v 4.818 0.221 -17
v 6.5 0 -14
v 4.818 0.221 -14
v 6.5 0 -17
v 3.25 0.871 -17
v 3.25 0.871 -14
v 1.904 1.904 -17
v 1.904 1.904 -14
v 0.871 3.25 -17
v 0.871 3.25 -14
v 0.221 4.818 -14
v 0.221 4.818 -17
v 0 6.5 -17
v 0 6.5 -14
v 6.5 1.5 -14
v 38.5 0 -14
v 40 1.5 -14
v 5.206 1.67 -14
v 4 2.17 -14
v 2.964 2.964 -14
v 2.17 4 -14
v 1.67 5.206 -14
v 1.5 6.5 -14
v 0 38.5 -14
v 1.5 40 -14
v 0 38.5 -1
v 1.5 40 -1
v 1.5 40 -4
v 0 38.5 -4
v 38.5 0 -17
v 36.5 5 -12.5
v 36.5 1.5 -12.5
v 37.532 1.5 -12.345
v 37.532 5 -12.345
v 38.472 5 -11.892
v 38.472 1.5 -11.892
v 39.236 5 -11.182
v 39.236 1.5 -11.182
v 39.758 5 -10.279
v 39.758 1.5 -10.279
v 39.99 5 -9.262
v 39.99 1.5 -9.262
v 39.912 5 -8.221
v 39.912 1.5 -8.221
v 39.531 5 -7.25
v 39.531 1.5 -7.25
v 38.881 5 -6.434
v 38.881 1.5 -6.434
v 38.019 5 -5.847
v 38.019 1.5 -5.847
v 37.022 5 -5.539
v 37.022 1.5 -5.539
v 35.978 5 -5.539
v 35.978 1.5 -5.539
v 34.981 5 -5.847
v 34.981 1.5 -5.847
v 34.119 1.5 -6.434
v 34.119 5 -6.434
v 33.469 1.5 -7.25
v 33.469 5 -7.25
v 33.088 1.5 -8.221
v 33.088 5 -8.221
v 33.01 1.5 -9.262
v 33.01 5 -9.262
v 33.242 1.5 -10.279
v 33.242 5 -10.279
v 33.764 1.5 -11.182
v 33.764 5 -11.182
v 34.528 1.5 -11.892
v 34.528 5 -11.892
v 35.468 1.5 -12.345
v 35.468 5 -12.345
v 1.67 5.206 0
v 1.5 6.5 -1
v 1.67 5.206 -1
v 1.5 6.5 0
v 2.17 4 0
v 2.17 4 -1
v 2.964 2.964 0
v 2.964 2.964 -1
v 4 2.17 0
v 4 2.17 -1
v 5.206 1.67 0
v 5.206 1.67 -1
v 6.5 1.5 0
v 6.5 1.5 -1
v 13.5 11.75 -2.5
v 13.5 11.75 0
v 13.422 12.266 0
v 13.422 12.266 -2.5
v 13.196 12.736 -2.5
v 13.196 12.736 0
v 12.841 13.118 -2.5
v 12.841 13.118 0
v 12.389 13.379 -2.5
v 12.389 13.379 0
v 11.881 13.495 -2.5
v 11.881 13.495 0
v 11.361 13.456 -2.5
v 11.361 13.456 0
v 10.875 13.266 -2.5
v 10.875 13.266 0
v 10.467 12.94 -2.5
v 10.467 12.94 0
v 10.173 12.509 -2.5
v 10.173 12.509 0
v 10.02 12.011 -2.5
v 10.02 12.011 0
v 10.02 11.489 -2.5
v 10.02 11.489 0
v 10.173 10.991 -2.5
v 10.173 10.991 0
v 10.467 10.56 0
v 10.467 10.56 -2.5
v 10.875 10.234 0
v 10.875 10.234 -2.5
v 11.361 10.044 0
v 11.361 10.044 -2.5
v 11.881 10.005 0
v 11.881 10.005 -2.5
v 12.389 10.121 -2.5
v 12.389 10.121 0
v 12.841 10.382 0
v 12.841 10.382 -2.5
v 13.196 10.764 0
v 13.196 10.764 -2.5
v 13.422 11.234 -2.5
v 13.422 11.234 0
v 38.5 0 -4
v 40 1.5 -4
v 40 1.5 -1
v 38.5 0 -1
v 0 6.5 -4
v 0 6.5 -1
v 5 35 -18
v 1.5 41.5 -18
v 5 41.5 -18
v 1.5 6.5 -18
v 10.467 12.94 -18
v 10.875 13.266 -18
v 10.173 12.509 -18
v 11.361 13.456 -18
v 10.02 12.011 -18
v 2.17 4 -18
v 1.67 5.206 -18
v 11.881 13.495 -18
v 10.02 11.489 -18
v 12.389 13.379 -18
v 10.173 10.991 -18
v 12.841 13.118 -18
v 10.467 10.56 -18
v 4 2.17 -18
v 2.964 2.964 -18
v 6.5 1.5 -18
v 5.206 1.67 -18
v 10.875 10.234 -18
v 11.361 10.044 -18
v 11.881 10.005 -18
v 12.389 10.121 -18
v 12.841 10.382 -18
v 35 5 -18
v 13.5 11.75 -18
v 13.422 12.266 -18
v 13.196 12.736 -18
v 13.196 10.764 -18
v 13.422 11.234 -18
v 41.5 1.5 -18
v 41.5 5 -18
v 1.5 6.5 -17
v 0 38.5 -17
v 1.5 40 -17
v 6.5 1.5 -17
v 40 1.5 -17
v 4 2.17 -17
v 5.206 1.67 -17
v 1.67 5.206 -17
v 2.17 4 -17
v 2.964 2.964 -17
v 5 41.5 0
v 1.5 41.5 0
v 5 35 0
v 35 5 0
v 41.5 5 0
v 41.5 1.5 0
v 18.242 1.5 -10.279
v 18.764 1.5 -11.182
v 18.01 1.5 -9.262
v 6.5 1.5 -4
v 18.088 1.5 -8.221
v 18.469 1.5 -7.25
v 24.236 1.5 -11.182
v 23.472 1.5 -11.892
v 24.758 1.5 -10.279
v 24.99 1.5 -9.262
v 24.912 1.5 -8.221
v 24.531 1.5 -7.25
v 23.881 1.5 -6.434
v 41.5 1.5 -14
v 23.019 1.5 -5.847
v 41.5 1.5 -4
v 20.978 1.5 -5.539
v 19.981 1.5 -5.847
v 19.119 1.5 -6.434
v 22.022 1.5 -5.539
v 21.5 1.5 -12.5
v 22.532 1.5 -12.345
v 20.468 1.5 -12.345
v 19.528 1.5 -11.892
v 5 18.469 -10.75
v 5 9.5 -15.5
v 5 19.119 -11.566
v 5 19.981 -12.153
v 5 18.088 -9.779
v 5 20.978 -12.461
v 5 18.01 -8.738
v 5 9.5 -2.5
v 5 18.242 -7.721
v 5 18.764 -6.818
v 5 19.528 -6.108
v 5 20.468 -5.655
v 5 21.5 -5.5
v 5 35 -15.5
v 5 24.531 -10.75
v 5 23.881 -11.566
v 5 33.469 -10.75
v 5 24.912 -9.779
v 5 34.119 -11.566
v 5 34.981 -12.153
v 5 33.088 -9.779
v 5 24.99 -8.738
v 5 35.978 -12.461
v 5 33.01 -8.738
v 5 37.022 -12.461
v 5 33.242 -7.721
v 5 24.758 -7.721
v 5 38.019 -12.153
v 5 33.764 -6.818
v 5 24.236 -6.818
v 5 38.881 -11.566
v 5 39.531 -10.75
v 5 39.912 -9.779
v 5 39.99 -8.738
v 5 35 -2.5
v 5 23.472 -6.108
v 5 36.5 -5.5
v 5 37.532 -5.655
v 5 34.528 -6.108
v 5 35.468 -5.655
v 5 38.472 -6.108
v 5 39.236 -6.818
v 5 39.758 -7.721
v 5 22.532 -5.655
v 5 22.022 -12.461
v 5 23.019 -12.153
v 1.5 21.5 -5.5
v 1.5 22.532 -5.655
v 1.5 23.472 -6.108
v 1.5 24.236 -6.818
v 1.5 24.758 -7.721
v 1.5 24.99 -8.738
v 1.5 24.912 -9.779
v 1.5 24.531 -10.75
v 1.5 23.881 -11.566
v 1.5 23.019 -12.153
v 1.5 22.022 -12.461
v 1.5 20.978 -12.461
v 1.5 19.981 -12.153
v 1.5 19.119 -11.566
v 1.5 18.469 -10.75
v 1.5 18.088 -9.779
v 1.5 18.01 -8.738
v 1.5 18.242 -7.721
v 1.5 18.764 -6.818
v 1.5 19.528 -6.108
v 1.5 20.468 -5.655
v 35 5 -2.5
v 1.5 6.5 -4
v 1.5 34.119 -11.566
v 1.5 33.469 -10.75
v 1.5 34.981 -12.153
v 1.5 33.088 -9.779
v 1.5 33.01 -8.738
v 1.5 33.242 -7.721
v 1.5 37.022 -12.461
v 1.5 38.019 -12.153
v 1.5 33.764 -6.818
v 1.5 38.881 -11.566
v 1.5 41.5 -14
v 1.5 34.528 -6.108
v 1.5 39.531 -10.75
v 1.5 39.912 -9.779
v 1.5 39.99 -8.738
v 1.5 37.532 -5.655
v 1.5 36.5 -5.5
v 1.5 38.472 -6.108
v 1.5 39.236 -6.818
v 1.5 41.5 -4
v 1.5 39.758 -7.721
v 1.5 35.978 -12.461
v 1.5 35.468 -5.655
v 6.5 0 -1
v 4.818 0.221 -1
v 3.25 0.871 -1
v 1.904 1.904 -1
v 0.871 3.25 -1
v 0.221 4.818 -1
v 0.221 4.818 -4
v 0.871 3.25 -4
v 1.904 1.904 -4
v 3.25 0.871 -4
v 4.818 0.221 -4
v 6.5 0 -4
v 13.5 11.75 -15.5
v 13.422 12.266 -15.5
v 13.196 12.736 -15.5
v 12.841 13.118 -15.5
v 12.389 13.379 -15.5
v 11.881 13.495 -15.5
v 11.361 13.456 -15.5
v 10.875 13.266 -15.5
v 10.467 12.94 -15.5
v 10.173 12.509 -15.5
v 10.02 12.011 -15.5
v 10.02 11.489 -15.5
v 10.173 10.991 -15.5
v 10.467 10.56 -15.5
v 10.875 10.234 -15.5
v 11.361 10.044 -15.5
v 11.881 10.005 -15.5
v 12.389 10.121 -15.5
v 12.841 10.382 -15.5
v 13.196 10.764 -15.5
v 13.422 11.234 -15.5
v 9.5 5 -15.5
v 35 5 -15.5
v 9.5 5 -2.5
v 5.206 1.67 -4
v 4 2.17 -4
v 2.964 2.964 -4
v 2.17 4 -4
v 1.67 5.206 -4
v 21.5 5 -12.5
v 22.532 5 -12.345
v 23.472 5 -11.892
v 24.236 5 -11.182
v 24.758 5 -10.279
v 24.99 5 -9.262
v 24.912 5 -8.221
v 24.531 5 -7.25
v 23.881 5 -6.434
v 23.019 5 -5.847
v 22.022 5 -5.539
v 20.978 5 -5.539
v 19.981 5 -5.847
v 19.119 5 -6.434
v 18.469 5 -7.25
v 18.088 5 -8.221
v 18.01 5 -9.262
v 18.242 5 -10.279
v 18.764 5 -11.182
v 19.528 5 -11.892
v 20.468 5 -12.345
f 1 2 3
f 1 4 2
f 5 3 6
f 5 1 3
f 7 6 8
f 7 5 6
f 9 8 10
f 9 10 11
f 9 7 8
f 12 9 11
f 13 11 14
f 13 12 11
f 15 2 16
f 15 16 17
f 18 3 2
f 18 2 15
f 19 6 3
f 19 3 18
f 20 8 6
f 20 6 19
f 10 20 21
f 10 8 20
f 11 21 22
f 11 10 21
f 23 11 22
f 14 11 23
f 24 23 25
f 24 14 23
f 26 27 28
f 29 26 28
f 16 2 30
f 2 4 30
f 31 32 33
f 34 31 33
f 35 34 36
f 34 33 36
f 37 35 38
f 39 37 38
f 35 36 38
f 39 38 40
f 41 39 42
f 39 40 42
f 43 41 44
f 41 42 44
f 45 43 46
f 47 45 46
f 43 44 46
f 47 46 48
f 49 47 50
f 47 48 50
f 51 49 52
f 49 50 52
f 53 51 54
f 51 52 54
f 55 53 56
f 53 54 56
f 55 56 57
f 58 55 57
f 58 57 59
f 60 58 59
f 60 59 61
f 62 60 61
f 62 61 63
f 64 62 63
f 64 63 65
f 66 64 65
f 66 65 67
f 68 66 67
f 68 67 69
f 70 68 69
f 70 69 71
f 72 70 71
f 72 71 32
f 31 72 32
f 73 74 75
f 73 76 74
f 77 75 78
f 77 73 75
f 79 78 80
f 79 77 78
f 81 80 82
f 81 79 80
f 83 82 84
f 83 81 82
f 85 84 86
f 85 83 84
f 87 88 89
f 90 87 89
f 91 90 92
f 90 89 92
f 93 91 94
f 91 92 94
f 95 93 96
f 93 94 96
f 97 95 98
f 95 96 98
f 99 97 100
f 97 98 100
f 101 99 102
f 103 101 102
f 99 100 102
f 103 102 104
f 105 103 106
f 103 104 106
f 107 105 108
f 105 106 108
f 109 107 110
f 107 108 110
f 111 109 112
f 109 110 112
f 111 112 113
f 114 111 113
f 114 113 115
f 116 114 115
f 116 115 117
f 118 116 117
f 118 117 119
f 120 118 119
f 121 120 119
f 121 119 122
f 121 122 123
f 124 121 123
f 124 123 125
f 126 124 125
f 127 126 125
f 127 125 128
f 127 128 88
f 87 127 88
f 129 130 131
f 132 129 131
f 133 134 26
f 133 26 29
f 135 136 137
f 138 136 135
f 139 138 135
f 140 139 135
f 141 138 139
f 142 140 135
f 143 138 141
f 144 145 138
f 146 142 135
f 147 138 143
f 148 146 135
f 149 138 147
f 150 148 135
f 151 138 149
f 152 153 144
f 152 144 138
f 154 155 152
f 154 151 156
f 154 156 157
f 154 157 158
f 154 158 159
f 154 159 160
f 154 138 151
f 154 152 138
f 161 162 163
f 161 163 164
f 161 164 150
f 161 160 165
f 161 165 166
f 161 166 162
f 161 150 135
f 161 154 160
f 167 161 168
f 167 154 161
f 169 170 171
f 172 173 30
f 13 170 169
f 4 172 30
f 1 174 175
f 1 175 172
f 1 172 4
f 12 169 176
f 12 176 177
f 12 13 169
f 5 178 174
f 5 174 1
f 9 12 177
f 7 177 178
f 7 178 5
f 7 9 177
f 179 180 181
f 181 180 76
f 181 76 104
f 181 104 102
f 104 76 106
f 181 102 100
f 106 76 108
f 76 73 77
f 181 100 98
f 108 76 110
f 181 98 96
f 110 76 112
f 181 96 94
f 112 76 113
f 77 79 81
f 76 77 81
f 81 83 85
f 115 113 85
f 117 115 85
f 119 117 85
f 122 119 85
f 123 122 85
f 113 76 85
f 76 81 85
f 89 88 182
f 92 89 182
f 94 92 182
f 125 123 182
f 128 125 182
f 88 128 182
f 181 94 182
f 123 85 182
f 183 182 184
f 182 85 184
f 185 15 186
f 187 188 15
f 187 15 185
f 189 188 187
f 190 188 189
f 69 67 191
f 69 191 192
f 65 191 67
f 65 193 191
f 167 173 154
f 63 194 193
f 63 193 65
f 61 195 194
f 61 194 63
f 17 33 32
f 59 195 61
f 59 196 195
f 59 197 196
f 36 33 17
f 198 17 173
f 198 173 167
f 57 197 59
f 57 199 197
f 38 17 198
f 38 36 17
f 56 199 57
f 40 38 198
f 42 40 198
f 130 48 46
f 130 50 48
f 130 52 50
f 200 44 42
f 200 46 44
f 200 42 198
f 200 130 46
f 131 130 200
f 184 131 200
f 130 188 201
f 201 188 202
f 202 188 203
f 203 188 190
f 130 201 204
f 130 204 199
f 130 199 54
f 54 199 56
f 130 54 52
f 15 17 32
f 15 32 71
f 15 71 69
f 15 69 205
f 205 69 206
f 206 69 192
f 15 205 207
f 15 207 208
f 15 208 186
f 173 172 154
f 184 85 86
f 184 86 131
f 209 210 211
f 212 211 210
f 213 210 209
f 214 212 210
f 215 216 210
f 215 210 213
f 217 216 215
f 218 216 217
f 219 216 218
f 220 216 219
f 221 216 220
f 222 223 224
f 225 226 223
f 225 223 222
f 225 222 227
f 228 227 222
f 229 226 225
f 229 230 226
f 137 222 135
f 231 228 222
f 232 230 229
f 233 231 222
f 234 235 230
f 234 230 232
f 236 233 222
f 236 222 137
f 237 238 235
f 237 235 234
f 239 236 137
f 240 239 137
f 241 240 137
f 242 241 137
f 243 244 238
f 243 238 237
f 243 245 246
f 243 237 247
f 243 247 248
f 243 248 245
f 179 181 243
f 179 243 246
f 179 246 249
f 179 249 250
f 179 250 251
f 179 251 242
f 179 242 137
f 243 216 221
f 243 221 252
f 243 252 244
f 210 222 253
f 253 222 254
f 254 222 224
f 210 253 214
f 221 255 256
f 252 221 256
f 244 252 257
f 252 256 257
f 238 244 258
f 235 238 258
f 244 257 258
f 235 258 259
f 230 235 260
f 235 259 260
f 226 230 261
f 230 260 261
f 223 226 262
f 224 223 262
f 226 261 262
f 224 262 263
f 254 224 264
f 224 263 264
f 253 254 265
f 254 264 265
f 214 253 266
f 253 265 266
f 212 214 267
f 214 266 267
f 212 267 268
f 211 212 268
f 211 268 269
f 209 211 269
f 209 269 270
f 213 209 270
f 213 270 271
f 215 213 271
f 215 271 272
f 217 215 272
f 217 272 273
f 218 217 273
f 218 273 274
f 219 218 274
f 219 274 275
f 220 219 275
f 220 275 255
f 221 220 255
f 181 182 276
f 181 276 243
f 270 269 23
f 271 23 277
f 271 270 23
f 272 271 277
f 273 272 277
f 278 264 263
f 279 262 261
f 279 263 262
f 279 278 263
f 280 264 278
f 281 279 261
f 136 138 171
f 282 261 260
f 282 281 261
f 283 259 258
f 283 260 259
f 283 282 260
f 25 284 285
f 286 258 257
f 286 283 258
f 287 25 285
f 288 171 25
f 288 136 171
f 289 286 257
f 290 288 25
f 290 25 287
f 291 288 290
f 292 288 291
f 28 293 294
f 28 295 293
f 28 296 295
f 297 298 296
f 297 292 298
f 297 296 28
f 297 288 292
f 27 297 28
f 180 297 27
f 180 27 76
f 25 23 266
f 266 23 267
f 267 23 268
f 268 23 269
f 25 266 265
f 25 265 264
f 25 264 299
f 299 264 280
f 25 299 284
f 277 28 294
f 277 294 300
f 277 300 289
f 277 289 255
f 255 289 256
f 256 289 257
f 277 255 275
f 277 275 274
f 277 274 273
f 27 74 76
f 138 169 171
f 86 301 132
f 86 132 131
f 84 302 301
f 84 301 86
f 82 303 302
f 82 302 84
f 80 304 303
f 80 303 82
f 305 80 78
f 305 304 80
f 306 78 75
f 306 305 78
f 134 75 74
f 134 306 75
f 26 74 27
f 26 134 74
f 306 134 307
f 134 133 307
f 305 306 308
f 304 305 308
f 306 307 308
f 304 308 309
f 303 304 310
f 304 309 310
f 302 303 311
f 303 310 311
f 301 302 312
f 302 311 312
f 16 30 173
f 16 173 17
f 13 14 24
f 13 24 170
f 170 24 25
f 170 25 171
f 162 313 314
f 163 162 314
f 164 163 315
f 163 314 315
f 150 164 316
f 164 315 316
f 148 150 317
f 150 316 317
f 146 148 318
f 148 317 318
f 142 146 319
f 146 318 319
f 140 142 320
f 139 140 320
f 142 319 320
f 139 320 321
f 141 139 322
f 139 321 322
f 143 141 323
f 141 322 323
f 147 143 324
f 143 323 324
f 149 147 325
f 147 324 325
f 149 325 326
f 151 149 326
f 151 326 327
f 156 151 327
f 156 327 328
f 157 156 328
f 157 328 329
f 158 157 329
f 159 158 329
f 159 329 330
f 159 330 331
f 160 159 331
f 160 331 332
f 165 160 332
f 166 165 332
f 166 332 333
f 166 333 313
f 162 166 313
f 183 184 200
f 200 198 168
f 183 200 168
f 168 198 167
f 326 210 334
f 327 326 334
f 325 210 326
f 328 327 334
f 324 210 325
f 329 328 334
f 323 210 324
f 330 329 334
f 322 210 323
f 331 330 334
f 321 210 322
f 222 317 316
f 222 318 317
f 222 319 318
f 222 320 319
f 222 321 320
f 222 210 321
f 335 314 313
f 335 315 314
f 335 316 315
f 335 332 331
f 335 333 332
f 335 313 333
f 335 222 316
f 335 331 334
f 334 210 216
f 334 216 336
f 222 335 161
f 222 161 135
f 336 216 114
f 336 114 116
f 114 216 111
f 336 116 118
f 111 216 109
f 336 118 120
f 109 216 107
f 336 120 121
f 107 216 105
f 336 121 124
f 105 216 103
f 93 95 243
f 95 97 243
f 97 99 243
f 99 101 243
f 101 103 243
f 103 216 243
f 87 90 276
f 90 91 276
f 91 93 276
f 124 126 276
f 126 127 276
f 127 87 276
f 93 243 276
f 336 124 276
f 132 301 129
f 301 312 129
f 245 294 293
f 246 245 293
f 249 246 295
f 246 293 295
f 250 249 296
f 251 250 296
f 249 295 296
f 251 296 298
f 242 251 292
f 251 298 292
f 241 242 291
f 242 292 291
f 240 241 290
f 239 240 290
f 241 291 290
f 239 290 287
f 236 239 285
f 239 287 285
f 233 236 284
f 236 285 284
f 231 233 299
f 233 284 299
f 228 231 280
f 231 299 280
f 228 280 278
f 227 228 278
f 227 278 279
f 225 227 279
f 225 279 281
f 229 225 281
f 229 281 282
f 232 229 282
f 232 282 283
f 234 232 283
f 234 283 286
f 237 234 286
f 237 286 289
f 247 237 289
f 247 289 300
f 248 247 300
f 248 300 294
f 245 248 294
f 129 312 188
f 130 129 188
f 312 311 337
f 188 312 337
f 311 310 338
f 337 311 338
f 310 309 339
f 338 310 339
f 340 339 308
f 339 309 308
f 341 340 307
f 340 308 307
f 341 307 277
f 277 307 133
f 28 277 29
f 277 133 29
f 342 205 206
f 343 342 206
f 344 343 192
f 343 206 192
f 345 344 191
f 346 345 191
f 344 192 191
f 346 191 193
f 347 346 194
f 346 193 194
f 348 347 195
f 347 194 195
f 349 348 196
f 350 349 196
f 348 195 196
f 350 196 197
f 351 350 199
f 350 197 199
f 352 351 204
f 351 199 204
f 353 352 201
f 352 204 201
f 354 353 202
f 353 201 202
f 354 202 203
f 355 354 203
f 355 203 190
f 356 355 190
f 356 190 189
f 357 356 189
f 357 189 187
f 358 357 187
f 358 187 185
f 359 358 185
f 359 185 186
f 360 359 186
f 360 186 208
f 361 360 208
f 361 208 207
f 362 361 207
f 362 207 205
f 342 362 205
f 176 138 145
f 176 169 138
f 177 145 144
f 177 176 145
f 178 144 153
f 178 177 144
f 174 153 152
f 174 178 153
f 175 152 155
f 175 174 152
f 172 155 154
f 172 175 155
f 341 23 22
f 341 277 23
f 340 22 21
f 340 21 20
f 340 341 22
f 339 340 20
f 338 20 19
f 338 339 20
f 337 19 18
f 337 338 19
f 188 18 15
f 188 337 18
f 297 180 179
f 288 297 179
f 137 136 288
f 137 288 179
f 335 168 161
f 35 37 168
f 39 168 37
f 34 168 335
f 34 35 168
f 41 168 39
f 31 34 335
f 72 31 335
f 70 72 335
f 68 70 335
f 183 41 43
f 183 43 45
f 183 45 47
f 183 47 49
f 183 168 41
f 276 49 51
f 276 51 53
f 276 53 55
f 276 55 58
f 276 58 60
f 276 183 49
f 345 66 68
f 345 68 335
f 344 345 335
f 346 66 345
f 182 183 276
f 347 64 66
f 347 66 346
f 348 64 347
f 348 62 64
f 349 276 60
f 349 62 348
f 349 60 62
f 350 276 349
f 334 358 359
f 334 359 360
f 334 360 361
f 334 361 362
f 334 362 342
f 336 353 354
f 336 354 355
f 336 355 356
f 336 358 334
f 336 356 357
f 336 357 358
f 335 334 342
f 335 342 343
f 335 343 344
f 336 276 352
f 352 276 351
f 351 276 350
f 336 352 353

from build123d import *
from OCP.BRepFilletAPI import BRepFilletAPI_MakeFillet

# Parameters (mm, degrees)
SKETCH_1_W           = 41.5
SKETCH_1_H           = 18
EXTRUDE_1_DEPTH      = 41.5
CUT_EXTRUDE_2_DEPTH  = 41.5
CUT_EXTRUDE_3_DEPTH  = 1.5
SKETCH_4_W           = 10
SKETCH_4_H           = 42.806652411
CUT_EXTRUDE_4_DEPTH  = 1.5
SKETCH_5_W           = 46.146220502
SKETCH_5_H           = 19
SKETCH_5_W_2         = 42.146220502
SKETCH_5_H_2         = 16
CUT_EXTRUDE_5_DEPTH  = 1.5
SKETCH_6_W           = 43.828309831
SKETCH_6_H           = 10
CUT_EXTRUDE_7_DEPTH  = 1.5
FILLET_8_R1          = 5
FILLET_8_R2          = 6.5
CHAMFER_1_SIZE       = 1.5
CUT_EXTRUDE_9_DEPTH  = 13
SKETCH_10_R          = 3.5
CUT_EXTRUDE_10_DEPTH = 10
SKETCH_11_R          = 3.5
CUT_EXTRUDE_11_DEPTH = 5
SKETCH_12_R          = 1.75
CUT_EXTRUDE_12_DEPTH = 20


with BuildPart() as part:
    # 草图1 → 拉伸1 (new body)
    with BuildSketch(Plane(origin=(0, 0, 0), x_dir=(1, 0, 0), z_dir=(0, 1, 0))):
        with Locations((20.75, 9)):
            Rectangle(SKETCH_1_W, SKETCH_1_H)
    extrude(amount=EXTRUDE_1_DEPTH)

    # 草图2 → 拉伸2 (cut)
    with BuildSketch(Plane.XY):
        Polygon((5, 41.5), (41.5, 41.5), (41.5, 5), (35, 5), (5, 35), align=None)
    extrude(amount=-CUT_EXTRUDE_2_DEPTH, mode=Mode.SUBTRACT)

    # 草图3 → 拉伸3 (cut)
    with BuildSketch(Plane.ZY):
        Polygon((1.5, 43), (1.5, -2.474095728), (-1, -2.474095728), (-1, 40), (-17, 40), (-17, -2.474095728), (-19.5, -2.474095728), (-19.5, 43), align=None)
    extrude(amount=-CUT_EXTRUDE_3_DEPTH, mode=Mode.SUBTRACT)

    # 草图4 → 拉伸4 (cut)
    with BuildSketch(Plane.ZY):
        with Locations((-9, 20.096673794)):
            Rectangle(SKETCH_4_W, SKETCH_4_H)
    extrude(amount=-CUT_EXTRUDE_4_DEPTH, mode=Mode.SUBTRACT)

    # 草图5 → 拉伸5 (cut)
    with BuildSketch(Plane.XZ):
        with Locations((19.426889749, -9)):
            Rectangle(SKETCH_5_W, SKETCH_5_H)
        with Locations((18.926889749, -9)):
            Rectangle(SKETCH_5_W_2, SKETCH_5_H_2, mode=Mode.SUBTRACT)
    extrude(amount=-CUT_EXTRUDE_5_DEPTH, mode=Mode.SUBTRACT)

    # 草图6 → 拉伸7 (cut)
    with BuildSketch(Plane.XZ):
        with Locations((19.585845085, -9)):
            Rectangle(SKETCH_6_W, SKETCH_6_H)
    extrude(amount=-CUT_EXTRUDE_7_DEPTH, mode=Mode.SUBTRACT)

    # 圆角8: one fillet with a radius per group of edges: ONE call of the kernel's fillet builder (fillet() takes one radius for all edges)
    fillet_8_edges_1 = [part.edges().sort_by_distance(p)[0] for p in [
        (1.5, 1.5, -17.5),
        (1.5, 1.5, -9),
        (1.5, 1.5, -0.5),
    ]]
    fillet_8_edges_2 = [part.edges().sort_by_distance(p)[0] for p in [
        (0, 0, -15.5),
        (0, 0, -2.5),
    ]]
    fillet_8 = BRepFilletAPI_MakeFillet(part.part.solid().wrapped)
    for e in fillet_8_edges_1:
        fillet_8.Add(FILLET_8_R1, e.wrapped)
    for e in fillet_8_edges_2:
        fillet_8.Add(FILLET_8_R2, e.wrapped)
    add(Compound.cast(fillet_8.Shape()), mode=Mode.REPLACE)

    # 倒角1
    chamfer_1_edges = [part.edges().sort_by_distance(p)[0] for p in [
        (0, 40, -2.5),
        (0, 40, -15.5),
        (40, 0, -2.5),
        (40, 0, -15.5),
    ]]
    chamfer(chamfer_1_edges, length=CHAMFER_1_SIZE - 0.0001)  # a hair under: the kernel refuses the full size

    # 草图9 → 拉伸9 (cut)
    with BuildSketch(Plane(origin=(0, 0, -15.5), x_dir=(-1, 0, 0), z_dir=(0, 0, -1))):
        Polygon((-5, 38.898928625), (-5, 9.5), (-9.5, 5), (-37.05605145, 5), (-37.05605145, 38.898928625), align=None)
    extrude(amount=-CUT_EXTRUDE_9_DEPTH, mode=Mode.SUBTRACT)

    # 草图10 → 拉伸10 (cut)
    with BuildSketch(Plane.XZ.offset(-1.5)):
        with Locations(Location((21.5, -9, 0), (0, 0, 270))):
            Circle(SKETCH_10_R)
        with Locations(Location((36.5, -9, 0), (0, 0, 270))):
            Circle(SKETCH_10_R)
    extrude(amount=-CUT_EXTRUDE_10_DEPTH, mode=Mode.SUBTRACT)

    # 草图11 → 拉伸11 (cut)
    with BuildSketch(Plane.ZY.offset(-1.5)):
        with Locations((-9, 21.5)):
            Circle(SKETCH_11_R)
        with Locations((-9, 36.5)):
            Circle(SKETCH_11_R)
    extrude(amount=-CUT_EXTRUDE_11_DEPTH, mode=Mode.SUBTRACT)

    # 草图12 → 拉伸12 (cut)
    with BuildSketch(Plane.XY):
        with Locations((11.75, 11.75)):
            Circle(SKETCH_12_R)
    extrude(amount=-CUT_EXTRUDE_12_DEPTH, mode=Mode.SUBTRACT)


solid = part.part
